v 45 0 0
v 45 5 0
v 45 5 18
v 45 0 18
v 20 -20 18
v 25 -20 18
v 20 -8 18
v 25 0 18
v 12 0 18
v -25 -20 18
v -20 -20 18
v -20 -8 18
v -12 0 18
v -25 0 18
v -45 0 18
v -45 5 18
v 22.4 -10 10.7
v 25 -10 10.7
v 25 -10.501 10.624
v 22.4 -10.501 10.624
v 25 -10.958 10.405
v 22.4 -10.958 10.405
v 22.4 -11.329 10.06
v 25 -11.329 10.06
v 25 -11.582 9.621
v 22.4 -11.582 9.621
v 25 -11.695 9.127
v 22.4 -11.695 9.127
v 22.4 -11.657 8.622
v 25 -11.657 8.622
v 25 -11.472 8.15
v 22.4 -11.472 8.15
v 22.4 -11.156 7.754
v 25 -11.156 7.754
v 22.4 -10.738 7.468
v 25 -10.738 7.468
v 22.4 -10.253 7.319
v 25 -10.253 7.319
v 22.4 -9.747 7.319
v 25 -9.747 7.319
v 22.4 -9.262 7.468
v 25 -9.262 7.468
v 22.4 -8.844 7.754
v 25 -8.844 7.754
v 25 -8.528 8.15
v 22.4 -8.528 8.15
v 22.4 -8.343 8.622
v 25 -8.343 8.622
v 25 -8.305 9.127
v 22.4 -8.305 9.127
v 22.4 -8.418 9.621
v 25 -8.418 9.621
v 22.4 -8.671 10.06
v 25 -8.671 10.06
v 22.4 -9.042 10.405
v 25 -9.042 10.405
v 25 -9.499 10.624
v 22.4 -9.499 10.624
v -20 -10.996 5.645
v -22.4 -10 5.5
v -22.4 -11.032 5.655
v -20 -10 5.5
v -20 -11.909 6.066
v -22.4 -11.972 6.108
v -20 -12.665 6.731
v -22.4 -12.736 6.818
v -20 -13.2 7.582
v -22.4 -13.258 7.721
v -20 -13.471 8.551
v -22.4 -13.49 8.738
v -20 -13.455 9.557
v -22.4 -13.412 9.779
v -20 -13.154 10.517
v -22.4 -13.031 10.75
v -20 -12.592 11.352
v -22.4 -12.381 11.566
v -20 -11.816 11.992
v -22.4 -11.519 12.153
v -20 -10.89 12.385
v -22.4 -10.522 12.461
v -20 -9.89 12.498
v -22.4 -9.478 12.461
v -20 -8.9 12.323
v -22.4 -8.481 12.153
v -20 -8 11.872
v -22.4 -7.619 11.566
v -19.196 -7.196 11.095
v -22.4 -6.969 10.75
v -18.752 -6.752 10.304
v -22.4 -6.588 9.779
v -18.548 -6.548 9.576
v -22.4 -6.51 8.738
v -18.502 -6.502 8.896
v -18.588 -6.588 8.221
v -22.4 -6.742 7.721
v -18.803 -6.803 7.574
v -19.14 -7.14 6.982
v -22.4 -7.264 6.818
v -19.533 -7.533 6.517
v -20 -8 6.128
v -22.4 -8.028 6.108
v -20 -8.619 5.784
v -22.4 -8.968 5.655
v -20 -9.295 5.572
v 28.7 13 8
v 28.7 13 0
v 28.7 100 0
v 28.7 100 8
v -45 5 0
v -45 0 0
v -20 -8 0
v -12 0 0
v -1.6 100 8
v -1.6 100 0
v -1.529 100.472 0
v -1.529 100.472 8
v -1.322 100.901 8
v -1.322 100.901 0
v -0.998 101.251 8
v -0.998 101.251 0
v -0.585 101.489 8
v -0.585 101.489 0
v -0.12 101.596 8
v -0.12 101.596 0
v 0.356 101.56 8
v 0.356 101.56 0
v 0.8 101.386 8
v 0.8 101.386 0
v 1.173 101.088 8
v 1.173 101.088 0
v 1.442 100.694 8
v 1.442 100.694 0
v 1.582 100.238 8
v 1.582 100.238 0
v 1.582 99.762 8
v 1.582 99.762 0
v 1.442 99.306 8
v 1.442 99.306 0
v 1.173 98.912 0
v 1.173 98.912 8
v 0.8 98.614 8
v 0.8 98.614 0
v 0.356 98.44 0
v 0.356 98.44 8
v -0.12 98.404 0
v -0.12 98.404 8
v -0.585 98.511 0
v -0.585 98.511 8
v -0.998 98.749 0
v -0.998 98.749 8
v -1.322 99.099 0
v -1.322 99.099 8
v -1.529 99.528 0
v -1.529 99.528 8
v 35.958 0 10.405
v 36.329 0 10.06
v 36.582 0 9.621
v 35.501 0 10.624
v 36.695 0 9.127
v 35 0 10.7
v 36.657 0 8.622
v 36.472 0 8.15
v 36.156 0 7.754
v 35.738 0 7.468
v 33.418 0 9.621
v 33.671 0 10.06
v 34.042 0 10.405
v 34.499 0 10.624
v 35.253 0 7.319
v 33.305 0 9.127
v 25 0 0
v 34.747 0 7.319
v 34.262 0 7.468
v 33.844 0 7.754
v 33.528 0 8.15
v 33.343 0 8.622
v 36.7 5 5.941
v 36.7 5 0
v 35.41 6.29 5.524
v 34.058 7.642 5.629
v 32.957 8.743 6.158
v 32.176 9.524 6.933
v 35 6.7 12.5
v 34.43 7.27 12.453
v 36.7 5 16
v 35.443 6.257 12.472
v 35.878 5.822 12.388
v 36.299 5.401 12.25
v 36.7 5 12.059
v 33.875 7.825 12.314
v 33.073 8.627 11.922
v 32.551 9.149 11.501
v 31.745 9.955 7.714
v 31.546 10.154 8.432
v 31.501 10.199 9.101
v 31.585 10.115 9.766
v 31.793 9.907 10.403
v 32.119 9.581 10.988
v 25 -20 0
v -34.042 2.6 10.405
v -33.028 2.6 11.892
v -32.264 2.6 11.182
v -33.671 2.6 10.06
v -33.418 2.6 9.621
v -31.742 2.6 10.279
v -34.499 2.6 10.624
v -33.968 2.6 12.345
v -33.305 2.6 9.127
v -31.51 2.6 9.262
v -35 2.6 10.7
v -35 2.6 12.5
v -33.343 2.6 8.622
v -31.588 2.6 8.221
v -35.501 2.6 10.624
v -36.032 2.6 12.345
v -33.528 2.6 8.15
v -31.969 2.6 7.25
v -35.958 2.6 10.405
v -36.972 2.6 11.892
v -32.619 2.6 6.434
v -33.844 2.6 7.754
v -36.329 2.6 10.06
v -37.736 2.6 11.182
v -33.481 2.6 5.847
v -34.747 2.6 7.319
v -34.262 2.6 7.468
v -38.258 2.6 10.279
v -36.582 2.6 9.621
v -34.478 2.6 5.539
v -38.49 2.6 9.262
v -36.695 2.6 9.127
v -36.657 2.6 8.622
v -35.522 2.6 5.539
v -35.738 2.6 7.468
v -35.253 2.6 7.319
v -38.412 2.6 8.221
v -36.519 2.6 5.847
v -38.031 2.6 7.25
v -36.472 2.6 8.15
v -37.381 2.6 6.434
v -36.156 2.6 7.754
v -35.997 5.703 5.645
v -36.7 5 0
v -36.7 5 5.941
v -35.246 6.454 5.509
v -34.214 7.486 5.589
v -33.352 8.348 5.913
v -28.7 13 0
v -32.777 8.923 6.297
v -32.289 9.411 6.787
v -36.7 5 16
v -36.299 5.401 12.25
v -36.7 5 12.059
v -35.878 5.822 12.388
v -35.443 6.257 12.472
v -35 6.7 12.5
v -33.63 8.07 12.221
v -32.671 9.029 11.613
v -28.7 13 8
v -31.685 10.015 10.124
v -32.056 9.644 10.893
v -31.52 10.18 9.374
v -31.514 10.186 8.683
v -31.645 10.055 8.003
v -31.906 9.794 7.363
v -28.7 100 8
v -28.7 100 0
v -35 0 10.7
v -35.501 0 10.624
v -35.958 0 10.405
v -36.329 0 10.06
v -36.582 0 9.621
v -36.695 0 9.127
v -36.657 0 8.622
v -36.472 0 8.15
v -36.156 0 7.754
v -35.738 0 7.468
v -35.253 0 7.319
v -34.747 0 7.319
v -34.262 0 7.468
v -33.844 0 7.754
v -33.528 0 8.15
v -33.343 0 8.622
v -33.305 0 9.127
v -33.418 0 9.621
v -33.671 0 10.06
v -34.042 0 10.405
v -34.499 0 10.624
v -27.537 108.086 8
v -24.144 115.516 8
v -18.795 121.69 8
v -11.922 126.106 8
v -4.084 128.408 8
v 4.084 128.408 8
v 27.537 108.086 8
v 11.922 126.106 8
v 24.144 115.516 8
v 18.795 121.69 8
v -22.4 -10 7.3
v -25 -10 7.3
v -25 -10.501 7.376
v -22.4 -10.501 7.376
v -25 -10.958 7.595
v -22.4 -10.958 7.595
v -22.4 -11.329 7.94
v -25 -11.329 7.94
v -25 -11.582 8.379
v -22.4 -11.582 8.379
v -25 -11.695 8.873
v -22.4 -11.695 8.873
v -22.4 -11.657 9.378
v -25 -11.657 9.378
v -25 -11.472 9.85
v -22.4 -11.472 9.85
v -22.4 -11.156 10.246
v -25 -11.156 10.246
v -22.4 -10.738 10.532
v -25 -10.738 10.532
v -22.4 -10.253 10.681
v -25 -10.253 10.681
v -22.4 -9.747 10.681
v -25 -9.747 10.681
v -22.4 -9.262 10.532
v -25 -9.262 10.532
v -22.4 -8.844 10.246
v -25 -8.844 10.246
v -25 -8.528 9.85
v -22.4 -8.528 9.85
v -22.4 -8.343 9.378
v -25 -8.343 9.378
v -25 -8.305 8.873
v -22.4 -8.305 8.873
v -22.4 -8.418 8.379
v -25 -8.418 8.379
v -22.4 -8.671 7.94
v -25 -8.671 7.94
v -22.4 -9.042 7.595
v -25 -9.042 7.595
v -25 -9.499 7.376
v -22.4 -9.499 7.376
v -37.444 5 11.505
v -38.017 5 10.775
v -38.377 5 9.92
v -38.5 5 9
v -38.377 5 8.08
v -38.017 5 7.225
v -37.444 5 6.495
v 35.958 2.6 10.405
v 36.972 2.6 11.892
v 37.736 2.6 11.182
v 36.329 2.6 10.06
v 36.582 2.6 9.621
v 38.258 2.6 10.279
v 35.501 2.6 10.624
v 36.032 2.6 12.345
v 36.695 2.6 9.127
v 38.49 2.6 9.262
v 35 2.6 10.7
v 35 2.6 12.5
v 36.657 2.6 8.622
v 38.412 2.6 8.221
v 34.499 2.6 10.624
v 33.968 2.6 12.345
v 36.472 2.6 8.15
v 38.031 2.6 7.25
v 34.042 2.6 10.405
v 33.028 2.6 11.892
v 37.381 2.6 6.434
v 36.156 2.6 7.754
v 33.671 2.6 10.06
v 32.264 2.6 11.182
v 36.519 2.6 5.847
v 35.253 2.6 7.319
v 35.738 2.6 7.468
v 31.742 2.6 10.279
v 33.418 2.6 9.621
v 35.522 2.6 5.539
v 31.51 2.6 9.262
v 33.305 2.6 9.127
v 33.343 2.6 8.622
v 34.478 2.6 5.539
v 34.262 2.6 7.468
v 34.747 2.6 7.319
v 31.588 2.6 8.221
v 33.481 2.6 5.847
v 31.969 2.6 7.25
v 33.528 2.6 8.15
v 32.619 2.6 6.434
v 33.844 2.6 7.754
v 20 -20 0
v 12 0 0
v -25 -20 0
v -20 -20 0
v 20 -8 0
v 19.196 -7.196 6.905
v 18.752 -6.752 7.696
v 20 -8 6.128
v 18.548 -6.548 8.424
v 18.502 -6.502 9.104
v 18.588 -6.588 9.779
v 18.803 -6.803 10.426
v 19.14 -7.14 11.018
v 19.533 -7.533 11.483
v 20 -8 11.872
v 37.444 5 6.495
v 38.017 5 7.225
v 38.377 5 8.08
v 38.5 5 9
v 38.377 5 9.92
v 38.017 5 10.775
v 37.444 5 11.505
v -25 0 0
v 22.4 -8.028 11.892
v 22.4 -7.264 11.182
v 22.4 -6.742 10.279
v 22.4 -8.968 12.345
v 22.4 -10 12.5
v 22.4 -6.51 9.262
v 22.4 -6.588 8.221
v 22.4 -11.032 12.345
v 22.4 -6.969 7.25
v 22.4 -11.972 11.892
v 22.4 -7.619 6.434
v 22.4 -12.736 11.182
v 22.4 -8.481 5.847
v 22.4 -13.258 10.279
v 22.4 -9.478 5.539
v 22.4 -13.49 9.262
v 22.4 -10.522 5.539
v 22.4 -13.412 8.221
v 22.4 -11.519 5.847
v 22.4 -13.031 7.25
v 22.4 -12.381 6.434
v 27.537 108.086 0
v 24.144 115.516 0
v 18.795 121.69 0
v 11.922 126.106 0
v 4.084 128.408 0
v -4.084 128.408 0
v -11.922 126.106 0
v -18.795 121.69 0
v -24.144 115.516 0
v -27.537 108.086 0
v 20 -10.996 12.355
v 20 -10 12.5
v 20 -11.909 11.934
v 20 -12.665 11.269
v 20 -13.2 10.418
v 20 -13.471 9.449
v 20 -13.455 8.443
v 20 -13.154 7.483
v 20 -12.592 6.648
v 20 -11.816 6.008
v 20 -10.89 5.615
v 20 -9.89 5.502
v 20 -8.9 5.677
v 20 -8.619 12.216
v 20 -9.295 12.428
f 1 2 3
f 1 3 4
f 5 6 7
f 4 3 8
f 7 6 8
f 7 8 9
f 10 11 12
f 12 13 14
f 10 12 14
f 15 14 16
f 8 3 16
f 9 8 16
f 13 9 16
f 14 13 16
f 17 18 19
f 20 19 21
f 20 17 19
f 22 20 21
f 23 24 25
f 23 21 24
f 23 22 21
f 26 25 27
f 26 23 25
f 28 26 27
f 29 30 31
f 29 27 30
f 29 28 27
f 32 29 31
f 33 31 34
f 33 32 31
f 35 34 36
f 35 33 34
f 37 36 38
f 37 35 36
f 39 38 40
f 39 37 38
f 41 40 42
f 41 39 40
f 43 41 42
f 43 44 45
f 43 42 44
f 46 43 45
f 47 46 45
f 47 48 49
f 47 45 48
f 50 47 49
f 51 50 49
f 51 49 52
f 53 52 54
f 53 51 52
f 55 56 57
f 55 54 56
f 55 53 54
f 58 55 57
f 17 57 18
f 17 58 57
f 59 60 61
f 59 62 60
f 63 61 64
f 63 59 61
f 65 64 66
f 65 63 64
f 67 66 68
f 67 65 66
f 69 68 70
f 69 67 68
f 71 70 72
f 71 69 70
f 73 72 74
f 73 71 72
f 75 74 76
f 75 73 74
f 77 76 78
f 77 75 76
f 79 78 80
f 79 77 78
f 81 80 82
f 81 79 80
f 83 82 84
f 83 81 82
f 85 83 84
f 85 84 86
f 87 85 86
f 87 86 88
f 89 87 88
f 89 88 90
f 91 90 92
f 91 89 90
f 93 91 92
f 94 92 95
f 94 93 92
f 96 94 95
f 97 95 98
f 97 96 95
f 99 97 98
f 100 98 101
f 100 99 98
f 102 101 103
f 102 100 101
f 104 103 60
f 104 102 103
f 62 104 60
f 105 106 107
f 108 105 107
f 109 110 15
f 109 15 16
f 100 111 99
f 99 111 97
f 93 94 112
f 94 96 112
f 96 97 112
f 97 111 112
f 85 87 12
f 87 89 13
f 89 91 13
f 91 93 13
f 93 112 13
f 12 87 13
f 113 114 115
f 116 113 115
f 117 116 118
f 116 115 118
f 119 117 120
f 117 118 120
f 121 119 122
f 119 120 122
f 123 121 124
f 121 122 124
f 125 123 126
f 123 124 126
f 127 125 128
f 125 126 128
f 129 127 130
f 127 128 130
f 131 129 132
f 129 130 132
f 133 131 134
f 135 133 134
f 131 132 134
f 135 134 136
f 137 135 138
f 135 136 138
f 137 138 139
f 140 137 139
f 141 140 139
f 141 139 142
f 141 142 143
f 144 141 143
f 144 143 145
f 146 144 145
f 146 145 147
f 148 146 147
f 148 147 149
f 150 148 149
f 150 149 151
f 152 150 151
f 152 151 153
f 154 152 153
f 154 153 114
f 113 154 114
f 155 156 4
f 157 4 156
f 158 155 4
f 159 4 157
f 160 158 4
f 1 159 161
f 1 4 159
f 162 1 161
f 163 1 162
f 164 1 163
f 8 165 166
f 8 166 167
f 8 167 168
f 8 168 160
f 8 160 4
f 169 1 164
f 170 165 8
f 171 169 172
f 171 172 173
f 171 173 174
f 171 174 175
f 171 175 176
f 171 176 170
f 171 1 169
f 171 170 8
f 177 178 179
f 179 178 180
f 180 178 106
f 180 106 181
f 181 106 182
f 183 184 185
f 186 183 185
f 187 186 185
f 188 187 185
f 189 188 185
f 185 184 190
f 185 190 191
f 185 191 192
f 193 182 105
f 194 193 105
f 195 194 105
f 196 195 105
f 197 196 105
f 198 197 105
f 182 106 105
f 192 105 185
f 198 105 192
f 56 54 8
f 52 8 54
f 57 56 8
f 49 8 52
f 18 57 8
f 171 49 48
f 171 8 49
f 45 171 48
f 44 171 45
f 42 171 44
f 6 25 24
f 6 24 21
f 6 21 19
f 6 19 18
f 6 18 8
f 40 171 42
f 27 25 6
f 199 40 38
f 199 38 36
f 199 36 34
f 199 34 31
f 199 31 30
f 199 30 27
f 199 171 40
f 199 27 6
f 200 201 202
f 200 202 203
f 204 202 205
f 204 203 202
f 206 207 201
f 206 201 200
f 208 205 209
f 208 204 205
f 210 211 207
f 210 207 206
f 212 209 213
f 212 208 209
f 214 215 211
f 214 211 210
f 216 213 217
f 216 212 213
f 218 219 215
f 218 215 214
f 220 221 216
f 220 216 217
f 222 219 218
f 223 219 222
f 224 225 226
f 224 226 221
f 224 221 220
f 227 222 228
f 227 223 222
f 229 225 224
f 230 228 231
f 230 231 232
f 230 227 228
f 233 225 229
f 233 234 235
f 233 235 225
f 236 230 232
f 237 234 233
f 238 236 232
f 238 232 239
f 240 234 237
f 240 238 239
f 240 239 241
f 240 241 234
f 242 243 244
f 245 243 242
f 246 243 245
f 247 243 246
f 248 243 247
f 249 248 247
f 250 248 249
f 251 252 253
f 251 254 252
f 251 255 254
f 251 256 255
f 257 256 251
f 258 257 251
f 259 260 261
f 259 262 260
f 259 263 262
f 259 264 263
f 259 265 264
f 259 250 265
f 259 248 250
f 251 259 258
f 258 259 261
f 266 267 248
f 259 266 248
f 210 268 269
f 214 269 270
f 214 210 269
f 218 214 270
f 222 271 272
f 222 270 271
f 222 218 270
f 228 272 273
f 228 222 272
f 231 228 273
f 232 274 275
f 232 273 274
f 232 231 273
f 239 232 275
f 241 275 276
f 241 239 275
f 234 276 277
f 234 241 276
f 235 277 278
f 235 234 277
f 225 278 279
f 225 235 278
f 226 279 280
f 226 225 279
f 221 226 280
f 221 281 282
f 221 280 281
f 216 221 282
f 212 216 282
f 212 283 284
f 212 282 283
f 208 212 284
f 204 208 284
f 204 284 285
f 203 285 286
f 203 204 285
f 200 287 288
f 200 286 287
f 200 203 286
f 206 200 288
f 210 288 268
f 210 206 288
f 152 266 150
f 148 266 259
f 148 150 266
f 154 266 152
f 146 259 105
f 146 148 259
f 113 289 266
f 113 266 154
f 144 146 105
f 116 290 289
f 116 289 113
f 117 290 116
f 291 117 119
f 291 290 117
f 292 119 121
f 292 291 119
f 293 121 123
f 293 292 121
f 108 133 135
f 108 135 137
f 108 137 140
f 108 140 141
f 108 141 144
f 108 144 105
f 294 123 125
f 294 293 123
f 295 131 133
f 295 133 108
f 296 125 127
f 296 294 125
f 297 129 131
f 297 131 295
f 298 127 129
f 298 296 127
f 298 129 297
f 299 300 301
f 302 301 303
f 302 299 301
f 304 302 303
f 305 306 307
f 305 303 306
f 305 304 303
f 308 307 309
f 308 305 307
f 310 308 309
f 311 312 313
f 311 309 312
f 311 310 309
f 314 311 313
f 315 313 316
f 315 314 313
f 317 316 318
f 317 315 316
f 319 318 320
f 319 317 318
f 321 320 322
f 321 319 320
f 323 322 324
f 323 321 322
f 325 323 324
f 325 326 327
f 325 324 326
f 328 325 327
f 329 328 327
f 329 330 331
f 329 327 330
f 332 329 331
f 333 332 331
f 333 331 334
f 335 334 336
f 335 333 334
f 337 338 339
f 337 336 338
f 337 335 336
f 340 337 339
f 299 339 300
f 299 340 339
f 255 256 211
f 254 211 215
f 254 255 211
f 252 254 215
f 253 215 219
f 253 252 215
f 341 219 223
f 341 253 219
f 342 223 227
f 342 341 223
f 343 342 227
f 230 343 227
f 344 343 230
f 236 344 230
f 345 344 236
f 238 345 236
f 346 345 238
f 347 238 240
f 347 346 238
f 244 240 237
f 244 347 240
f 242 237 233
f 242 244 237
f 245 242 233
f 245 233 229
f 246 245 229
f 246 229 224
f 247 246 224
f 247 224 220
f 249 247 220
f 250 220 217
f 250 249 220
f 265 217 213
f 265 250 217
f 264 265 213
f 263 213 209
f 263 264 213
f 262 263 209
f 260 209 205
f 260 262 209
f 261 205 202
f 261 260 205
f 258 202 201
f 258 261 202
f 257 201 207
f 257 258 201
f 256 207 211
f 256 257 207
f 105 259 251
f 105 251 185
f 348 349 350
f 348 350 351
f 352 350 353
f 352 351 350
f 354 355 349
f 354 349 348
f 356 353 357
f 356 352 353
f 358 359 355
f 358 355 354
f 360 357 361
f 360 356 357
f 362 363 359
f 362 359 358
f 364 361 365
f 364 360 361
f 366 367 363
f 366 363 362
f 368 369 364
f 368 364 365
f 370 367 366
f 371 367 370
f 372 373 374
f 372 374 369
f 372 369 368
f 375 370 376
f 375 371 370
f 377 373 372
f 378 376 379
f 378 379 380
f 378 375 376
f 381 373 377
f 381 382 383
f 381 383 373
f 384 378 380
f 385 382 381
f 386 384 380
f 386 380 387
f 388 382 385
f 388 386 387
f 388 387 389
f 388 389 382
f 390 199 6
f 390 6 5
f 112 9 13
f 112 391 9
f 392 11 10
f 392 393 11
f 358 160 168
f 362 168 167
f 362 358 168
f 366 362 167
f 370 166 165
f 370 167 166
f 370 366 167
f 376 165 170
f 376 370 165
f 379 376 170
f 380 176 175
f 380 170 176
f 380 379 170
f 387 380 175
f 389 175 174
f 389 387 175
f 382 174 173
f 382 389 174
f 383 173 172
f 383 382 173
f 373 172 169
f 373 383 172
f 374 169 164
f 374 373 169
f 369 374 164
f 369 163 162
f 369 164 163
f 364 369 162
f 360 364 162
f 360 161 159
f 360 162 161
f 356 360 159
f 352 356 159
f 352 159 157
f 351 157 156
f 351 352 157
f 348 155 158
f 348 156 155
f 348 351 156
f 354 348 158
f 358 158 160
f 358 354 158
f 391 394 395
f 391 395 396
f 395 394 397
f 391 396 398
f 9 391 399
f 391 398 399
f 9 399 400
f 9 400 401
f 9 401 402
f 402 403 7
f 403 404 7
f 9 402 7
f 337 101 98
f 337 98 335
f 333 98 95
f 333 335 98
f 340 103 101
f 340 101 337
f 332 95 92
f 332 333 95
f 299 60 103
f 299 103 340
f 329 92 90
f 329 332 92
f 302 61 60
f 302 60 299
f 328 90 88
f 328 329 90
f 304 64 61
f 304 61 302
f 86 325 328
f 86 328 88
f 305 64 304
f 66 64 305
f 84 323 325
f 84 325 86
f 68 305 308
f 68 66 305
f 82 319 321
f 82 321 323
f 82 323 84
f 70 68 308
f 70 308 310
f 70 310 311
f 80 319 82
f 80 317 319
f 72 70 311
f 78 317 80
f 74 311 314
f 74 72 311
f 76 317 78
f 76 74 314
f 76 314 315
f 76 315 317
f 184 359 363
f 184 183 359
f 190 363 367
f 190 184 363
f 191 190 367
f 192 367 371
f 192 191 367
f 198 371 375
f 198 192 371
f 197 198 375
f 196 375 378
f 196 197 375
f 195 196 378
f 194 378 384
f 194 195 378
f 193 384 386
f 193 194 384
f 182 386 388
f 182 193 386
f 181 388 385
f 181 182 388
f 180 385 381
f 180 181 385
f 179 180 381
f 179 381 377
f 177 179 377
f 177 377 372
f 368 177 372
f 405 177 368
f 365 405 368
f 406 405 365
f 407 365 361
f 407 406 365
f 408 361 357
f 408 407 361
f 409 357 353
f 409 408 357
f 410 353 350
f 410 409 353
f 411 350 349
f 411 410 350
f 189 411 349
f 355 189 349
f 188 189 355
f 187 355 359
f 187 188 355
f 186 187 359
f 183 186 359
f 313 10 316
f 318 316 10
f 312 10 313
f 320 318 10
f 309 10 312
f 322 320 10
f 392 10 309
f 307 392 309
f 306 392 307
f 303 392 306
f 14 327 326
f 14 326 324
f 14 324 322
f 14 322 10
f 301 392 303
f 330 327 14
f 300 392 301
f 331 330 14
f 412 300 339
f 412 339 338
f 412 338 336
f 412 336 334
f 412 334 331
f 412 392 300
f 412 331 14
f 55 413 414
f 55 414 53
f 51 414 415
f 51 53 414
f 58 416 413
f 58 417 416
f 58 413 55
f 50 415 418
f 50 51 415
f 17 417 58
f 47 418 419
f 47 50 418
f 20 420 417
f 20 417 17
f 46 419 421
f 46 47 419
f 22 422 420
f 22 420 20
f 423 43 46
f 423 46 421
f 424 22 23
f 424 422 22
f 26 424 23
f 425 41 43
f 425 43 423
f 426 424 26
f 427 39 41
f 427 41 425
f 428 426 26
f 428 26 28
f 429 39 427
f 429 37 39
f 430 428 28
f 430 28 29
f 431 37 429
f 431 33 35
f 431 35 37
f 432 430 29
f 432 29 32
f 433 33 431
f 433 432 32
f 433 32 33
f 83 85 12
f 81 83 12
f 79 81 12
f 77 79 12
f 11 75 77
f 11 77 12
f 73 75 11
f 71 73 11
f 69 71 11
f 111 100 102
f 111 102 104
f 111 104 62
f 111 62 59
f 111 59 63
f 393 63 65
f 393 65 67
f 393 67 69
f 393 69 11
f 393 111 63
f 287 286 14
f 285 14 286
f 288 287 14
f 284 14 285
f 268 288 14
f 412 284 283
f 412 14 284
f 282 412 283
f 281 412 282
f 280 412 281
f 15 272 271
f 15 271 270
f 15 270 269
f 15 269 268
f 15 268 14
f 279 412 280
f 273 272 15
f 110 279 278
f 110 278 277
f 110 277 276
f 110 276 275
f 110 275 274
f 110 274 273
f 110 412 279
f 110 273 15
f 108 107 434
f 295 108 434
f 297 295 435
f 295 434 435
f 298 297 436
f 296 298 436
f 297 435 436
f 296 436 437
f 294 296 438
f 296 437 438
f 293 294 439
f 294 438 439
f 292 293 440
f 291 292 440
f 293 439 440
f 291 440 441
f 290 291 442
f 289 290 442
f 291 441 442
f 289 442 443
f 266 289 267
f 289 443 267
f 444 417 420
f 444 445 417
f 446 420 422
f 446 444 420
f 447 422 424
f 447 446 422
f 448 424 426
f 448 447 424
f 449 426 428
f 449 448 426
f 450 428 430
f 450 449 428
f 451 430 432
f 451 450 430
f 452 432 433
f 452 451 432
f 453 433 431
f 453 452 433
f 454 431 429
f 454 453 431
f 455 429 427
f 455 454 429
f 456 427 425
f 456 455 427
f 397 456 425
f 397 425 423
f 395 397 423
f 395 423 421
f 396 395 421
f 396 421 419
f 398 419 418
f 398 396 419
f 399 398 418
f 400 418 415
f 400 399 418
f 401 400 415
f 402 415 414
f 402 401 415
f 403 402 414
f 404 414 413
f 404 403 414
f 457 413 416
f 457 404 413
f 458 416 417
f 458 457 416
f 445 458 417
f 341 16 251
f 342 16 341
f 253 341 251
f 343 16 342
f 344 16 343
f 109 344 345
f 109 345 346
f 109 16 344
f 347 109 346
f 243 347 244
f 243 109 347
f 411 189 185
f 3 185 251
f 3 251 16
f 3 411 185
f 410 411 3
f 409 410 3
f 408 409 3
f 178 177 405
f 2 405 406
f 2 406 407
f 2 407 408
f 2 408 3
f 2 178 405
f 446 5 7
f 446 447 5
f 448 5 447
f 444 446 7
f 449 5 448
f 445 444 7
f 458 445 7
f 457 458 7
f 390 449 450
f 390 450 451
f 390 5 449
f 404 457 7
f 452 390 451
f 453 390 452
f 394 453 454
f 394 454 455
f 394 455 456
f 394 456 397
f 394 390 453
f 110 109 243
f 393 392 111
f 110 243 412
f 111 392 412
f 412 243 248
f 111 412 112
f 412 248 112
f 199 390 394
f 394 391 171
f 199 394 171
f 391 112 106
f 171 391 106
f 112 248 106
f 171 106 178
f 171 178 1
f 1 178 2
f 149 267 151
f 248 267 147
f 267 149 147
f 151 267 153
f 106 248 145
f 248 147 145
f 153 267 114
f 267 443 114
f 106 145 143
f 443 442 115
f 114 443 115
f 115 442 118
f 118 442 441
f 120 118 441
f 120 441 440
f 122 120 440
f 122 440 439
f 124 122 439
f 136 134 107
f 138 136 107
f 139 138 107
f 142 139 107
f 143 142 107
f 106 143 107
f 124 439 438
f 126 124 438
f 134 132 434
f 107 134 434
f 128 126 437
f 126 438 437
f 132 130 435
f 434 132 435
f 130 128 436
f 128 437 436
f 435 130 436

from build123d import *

# Parameters (mm, degrees)
RESSALTO_EXTRUS_O1_DEPTH                     = 8
RESSALTO_EXTRUS_O2_DEPTH                     = 10
CHANFRO1_SIZE                                = 8
ESBO_O3_R                                    = 1.6
CORTE_EXTRUS_O1_DEPTH                        = 138.523416188
REBAIXO_PARA_PARAFUSO_COM_CABE_A_PAN_2_COUNT = 2
REBAIXO_PARA_PARAFUSO_COM_CABE_A_PAN_2_PITCH = 70
CORTE_EXTRUS_O3_REACH                        = 134.856
ESBO_O11_R                                   = 3.5
CORTE_EXTRUS_O4_START                        = 2
ESBO_O19_R                                   = 3.5
CORTE_EXTRUS_O4_DEPTH                        = 2


with BuildPart() as part:
    # Esboço1 → Ressalto-extrusão1 (new body)
    with BuildSketch(Plane.XY):
        with BuildLine():
            Line((-20, -20), (-20, 0))
            Line((-20, 0), (20, 0))
            Line((20, 0), (20, -20))
            Line((20, -20), (25, -20))
            Line((25, -20), (25, 0))
            Line((25, 0), (45, 0))
            Line((45, 0), (45, 5))
            Line((45, 5), (28.7, 5))
            Line((28.7, 5), (28.7, 100))
            ThreePointArc((28.7, 100), (0, 128.7), (-28.7, 100))
            Line((-28.7, 100), (-28.7, 5))
            Line((-28.7, 5), (-45, 5))
            Line((-45, 5), (-45, 0))
            Line((-45, 0), (-25, 0))
            Line((-25, 0), (-25, -20))
            Line((-25, -20), (-20, -20))
        make_face()
    extrude(amount=RESSALTO_EXTRUS_O1_DEPTH)

    # Esboço2 → Ressalto-extrusão2 (add)
    with BuildSketch(Plane.XY.offset(8)):
        Polygon((-20, -20), (-25, -20), (-25, 0), (-45, 0), (-45, 5), (45, 5), (45, 0), (25, 0), (25, -20), (20, -20), (20, 0), (-20, 0), align=None)
    extrude(amount=RESSALTO_EXTRUS_O2_DEPTH)

    # Chanfro1
    chanfro1_edges = [part.edges().sort_by_distance(p)[0] for p in [
        (28.7, 5, 4),
        (-28.7, 5, 4),
        (0, 5, 8),
        (20, 0, 9),
        (-20, 0, 9),
    ]]
    chamfer(chanfro1_edges, length=CHANFRO1_SIZE)

    # Esboço3 → Corte-extrusão1 (cut, through all)
    with BuildSketch(Plane(origin=(0, 0, 0), x_dir=(-1, 0, 0), z_dir=(0, 0, -1))):
        with Locations((0, 100)):
            Circle(ESBO_O3_R)
    extrude(amount=-CORTE_EXTRUS_O1_DEPTH, mode=Mode.SUBTRACT)

    # Esboço10 → Rebaixo para parafuso com cabe_a panela (revolve, cut)
    with BuildSketch(Plane(origin=(-35, 5, 9), x_dir=(0, 0, 1), z_dir=(1, 0, 0))):
        Polygon((0, 0), (0, 7.021463052), (1.7, 6), (1.7, 2.4), (3.5, 2.4), (3.5, 0), align=None)
    rebaixo_para_parafuso_com_cabe_a_panela = revolve(axis=Axis((-35, 11.35, 9), (0, -1, 0)), mode=Mode.SUBTRACT)

    # Rebaixo para parafuso com cabe_a pan 2: Rebaixo para parafuso com cabe_a panela ×2
    with Locations(*[(i * REBAIXO_PARA_PARAFUSO_COM_CABE_A_PAN_2_PITCH, 0, 0) for i in range(1, REBAIXO_PARA_PARAFUSO_COM_CABE_A_PAN_2_COUNT)]):
        add(rebaixo_para_parafuso_com_cabe_a_panela, mode=Mode.SUBTRACT)

    # Corte-extrusão3: up to this face of the body (flat: up to its plane)
    corte_extrus_o3_end = Plane(part.part.faces().sort_by_distance((33.144444444, 8.555555556, 6.222222222))[0])
    # Esboço11 → Corte-extrusão3 (cut, up to the picked face)
    with BuildSketch(Plane(origin=(0, 5, 0), x_dir=(1, 0, 0), z_dir=(0, 1, 0)), mode=Mode.PRIVATE) as corte_extrus_o3_sk1:
        with Locations((35, -9)):
            Circle(ESBO_O11_R)
    corte_extrus_o3_tool1 = split(extrude(corte_extrus_o3_sk1.sketch, amount=CORTE_EXTRUS_O3_REACH, mode=Mode.PRIVATE), bisect_by=corte_extrus_o3_end, keep=Keep.BOTH, mode=Mode.PRIVATE)
    # Esboço11 → Corte-extrusão3 (cut, up to the picked face)
    with BuildSketch(Plane(origin=(0, 5, 0), x_dir=(1, 0, 0), z_dir=(0, 1, 0)), mode=Mode.PRIVATE) as corte_extrus_o3_sk2:
        with Locations((-35, -9)):
            Circle(ESBO_O11_R)
    corte_extrus_o3_tool2 = split(extrude(corte_extrus_o3_sk2.sketch, amount=CORTE_EXTRUS_O3_REACH, mode=Mode.PRIVATE), bisect_by=corte_extrus_o3_end, keep=Keep.BOTH, mode=Mode.PRIVATE)
    add(corte_extrus_o3_tool1.solids().sort_by(Axis((35, 5, 9), (0, 1, 0)))[0], mode=Mode.SUBTRACT)
    add(corte_extrus_o3_tool2.solids().sort_by(Axis((-35, 5, 9), (0, 1, 0)))[0], mode=Mode.SUBTRACT)

    # Esboço18 → Rebaixo para parafuso com cabe_a pan 3 (revolve, cut)
    with BuildSketch(Plane(origin=(20, -10, 9), x_dir=(0, 0, 1), z_dir=(0, 1, 0))):
        Polygon((0, 0), (0, 7.021463052), (1.7, 6), (1.7, 2.4), (3.5, 2.4), (3.5, 0), align=None)
    revolve(axis=Axis((13.65, -10, 9), (1, 0, 0)), mode=Mode.SUBTRACT)

    # Esboço19 → Corte-extrusão4 (cut)
    with BuildSketch(Plane.ZY.offset(-20).offset(CORTE_EXTRUS_O4_START)):
        with Locations((9, -10)):
            Circle(ESBO_O19_R)
    corte_extrus_o4 = extrude(amount=-CORTE_EXTRUS_O4_DEPTH, mode=Mode.SUBTRACT)

    # Esboço21 → Rebaixo para parafuso com cabe_a pan 4 (revolve, cut)
    with BuildSketch(Plane(origin=(-20, -10, 9), x_dir=(0, 0, -1), z_dir=(0, 1, 0))):
        Polygon((0, 0), (0, 7.021463052), (1.7, 6), (1.7, 2.4), (3.5, 2.4), (3.5, 0), align=None)
    revolve(axis=Axis((-13.65, -10, 9), (-1, 0, 0)), mode=Mode.SUBTRACT)

    # Espelhar1: Corte-extrusão4 across plane
    add(corte_extrus_o4.mirror(Plane(origin=(0, 0, 0), x_dir=(0, 0, 1), z_dir=(1, 0, 0))), mode=Mode.SUBTRACT)


solid = part.part
